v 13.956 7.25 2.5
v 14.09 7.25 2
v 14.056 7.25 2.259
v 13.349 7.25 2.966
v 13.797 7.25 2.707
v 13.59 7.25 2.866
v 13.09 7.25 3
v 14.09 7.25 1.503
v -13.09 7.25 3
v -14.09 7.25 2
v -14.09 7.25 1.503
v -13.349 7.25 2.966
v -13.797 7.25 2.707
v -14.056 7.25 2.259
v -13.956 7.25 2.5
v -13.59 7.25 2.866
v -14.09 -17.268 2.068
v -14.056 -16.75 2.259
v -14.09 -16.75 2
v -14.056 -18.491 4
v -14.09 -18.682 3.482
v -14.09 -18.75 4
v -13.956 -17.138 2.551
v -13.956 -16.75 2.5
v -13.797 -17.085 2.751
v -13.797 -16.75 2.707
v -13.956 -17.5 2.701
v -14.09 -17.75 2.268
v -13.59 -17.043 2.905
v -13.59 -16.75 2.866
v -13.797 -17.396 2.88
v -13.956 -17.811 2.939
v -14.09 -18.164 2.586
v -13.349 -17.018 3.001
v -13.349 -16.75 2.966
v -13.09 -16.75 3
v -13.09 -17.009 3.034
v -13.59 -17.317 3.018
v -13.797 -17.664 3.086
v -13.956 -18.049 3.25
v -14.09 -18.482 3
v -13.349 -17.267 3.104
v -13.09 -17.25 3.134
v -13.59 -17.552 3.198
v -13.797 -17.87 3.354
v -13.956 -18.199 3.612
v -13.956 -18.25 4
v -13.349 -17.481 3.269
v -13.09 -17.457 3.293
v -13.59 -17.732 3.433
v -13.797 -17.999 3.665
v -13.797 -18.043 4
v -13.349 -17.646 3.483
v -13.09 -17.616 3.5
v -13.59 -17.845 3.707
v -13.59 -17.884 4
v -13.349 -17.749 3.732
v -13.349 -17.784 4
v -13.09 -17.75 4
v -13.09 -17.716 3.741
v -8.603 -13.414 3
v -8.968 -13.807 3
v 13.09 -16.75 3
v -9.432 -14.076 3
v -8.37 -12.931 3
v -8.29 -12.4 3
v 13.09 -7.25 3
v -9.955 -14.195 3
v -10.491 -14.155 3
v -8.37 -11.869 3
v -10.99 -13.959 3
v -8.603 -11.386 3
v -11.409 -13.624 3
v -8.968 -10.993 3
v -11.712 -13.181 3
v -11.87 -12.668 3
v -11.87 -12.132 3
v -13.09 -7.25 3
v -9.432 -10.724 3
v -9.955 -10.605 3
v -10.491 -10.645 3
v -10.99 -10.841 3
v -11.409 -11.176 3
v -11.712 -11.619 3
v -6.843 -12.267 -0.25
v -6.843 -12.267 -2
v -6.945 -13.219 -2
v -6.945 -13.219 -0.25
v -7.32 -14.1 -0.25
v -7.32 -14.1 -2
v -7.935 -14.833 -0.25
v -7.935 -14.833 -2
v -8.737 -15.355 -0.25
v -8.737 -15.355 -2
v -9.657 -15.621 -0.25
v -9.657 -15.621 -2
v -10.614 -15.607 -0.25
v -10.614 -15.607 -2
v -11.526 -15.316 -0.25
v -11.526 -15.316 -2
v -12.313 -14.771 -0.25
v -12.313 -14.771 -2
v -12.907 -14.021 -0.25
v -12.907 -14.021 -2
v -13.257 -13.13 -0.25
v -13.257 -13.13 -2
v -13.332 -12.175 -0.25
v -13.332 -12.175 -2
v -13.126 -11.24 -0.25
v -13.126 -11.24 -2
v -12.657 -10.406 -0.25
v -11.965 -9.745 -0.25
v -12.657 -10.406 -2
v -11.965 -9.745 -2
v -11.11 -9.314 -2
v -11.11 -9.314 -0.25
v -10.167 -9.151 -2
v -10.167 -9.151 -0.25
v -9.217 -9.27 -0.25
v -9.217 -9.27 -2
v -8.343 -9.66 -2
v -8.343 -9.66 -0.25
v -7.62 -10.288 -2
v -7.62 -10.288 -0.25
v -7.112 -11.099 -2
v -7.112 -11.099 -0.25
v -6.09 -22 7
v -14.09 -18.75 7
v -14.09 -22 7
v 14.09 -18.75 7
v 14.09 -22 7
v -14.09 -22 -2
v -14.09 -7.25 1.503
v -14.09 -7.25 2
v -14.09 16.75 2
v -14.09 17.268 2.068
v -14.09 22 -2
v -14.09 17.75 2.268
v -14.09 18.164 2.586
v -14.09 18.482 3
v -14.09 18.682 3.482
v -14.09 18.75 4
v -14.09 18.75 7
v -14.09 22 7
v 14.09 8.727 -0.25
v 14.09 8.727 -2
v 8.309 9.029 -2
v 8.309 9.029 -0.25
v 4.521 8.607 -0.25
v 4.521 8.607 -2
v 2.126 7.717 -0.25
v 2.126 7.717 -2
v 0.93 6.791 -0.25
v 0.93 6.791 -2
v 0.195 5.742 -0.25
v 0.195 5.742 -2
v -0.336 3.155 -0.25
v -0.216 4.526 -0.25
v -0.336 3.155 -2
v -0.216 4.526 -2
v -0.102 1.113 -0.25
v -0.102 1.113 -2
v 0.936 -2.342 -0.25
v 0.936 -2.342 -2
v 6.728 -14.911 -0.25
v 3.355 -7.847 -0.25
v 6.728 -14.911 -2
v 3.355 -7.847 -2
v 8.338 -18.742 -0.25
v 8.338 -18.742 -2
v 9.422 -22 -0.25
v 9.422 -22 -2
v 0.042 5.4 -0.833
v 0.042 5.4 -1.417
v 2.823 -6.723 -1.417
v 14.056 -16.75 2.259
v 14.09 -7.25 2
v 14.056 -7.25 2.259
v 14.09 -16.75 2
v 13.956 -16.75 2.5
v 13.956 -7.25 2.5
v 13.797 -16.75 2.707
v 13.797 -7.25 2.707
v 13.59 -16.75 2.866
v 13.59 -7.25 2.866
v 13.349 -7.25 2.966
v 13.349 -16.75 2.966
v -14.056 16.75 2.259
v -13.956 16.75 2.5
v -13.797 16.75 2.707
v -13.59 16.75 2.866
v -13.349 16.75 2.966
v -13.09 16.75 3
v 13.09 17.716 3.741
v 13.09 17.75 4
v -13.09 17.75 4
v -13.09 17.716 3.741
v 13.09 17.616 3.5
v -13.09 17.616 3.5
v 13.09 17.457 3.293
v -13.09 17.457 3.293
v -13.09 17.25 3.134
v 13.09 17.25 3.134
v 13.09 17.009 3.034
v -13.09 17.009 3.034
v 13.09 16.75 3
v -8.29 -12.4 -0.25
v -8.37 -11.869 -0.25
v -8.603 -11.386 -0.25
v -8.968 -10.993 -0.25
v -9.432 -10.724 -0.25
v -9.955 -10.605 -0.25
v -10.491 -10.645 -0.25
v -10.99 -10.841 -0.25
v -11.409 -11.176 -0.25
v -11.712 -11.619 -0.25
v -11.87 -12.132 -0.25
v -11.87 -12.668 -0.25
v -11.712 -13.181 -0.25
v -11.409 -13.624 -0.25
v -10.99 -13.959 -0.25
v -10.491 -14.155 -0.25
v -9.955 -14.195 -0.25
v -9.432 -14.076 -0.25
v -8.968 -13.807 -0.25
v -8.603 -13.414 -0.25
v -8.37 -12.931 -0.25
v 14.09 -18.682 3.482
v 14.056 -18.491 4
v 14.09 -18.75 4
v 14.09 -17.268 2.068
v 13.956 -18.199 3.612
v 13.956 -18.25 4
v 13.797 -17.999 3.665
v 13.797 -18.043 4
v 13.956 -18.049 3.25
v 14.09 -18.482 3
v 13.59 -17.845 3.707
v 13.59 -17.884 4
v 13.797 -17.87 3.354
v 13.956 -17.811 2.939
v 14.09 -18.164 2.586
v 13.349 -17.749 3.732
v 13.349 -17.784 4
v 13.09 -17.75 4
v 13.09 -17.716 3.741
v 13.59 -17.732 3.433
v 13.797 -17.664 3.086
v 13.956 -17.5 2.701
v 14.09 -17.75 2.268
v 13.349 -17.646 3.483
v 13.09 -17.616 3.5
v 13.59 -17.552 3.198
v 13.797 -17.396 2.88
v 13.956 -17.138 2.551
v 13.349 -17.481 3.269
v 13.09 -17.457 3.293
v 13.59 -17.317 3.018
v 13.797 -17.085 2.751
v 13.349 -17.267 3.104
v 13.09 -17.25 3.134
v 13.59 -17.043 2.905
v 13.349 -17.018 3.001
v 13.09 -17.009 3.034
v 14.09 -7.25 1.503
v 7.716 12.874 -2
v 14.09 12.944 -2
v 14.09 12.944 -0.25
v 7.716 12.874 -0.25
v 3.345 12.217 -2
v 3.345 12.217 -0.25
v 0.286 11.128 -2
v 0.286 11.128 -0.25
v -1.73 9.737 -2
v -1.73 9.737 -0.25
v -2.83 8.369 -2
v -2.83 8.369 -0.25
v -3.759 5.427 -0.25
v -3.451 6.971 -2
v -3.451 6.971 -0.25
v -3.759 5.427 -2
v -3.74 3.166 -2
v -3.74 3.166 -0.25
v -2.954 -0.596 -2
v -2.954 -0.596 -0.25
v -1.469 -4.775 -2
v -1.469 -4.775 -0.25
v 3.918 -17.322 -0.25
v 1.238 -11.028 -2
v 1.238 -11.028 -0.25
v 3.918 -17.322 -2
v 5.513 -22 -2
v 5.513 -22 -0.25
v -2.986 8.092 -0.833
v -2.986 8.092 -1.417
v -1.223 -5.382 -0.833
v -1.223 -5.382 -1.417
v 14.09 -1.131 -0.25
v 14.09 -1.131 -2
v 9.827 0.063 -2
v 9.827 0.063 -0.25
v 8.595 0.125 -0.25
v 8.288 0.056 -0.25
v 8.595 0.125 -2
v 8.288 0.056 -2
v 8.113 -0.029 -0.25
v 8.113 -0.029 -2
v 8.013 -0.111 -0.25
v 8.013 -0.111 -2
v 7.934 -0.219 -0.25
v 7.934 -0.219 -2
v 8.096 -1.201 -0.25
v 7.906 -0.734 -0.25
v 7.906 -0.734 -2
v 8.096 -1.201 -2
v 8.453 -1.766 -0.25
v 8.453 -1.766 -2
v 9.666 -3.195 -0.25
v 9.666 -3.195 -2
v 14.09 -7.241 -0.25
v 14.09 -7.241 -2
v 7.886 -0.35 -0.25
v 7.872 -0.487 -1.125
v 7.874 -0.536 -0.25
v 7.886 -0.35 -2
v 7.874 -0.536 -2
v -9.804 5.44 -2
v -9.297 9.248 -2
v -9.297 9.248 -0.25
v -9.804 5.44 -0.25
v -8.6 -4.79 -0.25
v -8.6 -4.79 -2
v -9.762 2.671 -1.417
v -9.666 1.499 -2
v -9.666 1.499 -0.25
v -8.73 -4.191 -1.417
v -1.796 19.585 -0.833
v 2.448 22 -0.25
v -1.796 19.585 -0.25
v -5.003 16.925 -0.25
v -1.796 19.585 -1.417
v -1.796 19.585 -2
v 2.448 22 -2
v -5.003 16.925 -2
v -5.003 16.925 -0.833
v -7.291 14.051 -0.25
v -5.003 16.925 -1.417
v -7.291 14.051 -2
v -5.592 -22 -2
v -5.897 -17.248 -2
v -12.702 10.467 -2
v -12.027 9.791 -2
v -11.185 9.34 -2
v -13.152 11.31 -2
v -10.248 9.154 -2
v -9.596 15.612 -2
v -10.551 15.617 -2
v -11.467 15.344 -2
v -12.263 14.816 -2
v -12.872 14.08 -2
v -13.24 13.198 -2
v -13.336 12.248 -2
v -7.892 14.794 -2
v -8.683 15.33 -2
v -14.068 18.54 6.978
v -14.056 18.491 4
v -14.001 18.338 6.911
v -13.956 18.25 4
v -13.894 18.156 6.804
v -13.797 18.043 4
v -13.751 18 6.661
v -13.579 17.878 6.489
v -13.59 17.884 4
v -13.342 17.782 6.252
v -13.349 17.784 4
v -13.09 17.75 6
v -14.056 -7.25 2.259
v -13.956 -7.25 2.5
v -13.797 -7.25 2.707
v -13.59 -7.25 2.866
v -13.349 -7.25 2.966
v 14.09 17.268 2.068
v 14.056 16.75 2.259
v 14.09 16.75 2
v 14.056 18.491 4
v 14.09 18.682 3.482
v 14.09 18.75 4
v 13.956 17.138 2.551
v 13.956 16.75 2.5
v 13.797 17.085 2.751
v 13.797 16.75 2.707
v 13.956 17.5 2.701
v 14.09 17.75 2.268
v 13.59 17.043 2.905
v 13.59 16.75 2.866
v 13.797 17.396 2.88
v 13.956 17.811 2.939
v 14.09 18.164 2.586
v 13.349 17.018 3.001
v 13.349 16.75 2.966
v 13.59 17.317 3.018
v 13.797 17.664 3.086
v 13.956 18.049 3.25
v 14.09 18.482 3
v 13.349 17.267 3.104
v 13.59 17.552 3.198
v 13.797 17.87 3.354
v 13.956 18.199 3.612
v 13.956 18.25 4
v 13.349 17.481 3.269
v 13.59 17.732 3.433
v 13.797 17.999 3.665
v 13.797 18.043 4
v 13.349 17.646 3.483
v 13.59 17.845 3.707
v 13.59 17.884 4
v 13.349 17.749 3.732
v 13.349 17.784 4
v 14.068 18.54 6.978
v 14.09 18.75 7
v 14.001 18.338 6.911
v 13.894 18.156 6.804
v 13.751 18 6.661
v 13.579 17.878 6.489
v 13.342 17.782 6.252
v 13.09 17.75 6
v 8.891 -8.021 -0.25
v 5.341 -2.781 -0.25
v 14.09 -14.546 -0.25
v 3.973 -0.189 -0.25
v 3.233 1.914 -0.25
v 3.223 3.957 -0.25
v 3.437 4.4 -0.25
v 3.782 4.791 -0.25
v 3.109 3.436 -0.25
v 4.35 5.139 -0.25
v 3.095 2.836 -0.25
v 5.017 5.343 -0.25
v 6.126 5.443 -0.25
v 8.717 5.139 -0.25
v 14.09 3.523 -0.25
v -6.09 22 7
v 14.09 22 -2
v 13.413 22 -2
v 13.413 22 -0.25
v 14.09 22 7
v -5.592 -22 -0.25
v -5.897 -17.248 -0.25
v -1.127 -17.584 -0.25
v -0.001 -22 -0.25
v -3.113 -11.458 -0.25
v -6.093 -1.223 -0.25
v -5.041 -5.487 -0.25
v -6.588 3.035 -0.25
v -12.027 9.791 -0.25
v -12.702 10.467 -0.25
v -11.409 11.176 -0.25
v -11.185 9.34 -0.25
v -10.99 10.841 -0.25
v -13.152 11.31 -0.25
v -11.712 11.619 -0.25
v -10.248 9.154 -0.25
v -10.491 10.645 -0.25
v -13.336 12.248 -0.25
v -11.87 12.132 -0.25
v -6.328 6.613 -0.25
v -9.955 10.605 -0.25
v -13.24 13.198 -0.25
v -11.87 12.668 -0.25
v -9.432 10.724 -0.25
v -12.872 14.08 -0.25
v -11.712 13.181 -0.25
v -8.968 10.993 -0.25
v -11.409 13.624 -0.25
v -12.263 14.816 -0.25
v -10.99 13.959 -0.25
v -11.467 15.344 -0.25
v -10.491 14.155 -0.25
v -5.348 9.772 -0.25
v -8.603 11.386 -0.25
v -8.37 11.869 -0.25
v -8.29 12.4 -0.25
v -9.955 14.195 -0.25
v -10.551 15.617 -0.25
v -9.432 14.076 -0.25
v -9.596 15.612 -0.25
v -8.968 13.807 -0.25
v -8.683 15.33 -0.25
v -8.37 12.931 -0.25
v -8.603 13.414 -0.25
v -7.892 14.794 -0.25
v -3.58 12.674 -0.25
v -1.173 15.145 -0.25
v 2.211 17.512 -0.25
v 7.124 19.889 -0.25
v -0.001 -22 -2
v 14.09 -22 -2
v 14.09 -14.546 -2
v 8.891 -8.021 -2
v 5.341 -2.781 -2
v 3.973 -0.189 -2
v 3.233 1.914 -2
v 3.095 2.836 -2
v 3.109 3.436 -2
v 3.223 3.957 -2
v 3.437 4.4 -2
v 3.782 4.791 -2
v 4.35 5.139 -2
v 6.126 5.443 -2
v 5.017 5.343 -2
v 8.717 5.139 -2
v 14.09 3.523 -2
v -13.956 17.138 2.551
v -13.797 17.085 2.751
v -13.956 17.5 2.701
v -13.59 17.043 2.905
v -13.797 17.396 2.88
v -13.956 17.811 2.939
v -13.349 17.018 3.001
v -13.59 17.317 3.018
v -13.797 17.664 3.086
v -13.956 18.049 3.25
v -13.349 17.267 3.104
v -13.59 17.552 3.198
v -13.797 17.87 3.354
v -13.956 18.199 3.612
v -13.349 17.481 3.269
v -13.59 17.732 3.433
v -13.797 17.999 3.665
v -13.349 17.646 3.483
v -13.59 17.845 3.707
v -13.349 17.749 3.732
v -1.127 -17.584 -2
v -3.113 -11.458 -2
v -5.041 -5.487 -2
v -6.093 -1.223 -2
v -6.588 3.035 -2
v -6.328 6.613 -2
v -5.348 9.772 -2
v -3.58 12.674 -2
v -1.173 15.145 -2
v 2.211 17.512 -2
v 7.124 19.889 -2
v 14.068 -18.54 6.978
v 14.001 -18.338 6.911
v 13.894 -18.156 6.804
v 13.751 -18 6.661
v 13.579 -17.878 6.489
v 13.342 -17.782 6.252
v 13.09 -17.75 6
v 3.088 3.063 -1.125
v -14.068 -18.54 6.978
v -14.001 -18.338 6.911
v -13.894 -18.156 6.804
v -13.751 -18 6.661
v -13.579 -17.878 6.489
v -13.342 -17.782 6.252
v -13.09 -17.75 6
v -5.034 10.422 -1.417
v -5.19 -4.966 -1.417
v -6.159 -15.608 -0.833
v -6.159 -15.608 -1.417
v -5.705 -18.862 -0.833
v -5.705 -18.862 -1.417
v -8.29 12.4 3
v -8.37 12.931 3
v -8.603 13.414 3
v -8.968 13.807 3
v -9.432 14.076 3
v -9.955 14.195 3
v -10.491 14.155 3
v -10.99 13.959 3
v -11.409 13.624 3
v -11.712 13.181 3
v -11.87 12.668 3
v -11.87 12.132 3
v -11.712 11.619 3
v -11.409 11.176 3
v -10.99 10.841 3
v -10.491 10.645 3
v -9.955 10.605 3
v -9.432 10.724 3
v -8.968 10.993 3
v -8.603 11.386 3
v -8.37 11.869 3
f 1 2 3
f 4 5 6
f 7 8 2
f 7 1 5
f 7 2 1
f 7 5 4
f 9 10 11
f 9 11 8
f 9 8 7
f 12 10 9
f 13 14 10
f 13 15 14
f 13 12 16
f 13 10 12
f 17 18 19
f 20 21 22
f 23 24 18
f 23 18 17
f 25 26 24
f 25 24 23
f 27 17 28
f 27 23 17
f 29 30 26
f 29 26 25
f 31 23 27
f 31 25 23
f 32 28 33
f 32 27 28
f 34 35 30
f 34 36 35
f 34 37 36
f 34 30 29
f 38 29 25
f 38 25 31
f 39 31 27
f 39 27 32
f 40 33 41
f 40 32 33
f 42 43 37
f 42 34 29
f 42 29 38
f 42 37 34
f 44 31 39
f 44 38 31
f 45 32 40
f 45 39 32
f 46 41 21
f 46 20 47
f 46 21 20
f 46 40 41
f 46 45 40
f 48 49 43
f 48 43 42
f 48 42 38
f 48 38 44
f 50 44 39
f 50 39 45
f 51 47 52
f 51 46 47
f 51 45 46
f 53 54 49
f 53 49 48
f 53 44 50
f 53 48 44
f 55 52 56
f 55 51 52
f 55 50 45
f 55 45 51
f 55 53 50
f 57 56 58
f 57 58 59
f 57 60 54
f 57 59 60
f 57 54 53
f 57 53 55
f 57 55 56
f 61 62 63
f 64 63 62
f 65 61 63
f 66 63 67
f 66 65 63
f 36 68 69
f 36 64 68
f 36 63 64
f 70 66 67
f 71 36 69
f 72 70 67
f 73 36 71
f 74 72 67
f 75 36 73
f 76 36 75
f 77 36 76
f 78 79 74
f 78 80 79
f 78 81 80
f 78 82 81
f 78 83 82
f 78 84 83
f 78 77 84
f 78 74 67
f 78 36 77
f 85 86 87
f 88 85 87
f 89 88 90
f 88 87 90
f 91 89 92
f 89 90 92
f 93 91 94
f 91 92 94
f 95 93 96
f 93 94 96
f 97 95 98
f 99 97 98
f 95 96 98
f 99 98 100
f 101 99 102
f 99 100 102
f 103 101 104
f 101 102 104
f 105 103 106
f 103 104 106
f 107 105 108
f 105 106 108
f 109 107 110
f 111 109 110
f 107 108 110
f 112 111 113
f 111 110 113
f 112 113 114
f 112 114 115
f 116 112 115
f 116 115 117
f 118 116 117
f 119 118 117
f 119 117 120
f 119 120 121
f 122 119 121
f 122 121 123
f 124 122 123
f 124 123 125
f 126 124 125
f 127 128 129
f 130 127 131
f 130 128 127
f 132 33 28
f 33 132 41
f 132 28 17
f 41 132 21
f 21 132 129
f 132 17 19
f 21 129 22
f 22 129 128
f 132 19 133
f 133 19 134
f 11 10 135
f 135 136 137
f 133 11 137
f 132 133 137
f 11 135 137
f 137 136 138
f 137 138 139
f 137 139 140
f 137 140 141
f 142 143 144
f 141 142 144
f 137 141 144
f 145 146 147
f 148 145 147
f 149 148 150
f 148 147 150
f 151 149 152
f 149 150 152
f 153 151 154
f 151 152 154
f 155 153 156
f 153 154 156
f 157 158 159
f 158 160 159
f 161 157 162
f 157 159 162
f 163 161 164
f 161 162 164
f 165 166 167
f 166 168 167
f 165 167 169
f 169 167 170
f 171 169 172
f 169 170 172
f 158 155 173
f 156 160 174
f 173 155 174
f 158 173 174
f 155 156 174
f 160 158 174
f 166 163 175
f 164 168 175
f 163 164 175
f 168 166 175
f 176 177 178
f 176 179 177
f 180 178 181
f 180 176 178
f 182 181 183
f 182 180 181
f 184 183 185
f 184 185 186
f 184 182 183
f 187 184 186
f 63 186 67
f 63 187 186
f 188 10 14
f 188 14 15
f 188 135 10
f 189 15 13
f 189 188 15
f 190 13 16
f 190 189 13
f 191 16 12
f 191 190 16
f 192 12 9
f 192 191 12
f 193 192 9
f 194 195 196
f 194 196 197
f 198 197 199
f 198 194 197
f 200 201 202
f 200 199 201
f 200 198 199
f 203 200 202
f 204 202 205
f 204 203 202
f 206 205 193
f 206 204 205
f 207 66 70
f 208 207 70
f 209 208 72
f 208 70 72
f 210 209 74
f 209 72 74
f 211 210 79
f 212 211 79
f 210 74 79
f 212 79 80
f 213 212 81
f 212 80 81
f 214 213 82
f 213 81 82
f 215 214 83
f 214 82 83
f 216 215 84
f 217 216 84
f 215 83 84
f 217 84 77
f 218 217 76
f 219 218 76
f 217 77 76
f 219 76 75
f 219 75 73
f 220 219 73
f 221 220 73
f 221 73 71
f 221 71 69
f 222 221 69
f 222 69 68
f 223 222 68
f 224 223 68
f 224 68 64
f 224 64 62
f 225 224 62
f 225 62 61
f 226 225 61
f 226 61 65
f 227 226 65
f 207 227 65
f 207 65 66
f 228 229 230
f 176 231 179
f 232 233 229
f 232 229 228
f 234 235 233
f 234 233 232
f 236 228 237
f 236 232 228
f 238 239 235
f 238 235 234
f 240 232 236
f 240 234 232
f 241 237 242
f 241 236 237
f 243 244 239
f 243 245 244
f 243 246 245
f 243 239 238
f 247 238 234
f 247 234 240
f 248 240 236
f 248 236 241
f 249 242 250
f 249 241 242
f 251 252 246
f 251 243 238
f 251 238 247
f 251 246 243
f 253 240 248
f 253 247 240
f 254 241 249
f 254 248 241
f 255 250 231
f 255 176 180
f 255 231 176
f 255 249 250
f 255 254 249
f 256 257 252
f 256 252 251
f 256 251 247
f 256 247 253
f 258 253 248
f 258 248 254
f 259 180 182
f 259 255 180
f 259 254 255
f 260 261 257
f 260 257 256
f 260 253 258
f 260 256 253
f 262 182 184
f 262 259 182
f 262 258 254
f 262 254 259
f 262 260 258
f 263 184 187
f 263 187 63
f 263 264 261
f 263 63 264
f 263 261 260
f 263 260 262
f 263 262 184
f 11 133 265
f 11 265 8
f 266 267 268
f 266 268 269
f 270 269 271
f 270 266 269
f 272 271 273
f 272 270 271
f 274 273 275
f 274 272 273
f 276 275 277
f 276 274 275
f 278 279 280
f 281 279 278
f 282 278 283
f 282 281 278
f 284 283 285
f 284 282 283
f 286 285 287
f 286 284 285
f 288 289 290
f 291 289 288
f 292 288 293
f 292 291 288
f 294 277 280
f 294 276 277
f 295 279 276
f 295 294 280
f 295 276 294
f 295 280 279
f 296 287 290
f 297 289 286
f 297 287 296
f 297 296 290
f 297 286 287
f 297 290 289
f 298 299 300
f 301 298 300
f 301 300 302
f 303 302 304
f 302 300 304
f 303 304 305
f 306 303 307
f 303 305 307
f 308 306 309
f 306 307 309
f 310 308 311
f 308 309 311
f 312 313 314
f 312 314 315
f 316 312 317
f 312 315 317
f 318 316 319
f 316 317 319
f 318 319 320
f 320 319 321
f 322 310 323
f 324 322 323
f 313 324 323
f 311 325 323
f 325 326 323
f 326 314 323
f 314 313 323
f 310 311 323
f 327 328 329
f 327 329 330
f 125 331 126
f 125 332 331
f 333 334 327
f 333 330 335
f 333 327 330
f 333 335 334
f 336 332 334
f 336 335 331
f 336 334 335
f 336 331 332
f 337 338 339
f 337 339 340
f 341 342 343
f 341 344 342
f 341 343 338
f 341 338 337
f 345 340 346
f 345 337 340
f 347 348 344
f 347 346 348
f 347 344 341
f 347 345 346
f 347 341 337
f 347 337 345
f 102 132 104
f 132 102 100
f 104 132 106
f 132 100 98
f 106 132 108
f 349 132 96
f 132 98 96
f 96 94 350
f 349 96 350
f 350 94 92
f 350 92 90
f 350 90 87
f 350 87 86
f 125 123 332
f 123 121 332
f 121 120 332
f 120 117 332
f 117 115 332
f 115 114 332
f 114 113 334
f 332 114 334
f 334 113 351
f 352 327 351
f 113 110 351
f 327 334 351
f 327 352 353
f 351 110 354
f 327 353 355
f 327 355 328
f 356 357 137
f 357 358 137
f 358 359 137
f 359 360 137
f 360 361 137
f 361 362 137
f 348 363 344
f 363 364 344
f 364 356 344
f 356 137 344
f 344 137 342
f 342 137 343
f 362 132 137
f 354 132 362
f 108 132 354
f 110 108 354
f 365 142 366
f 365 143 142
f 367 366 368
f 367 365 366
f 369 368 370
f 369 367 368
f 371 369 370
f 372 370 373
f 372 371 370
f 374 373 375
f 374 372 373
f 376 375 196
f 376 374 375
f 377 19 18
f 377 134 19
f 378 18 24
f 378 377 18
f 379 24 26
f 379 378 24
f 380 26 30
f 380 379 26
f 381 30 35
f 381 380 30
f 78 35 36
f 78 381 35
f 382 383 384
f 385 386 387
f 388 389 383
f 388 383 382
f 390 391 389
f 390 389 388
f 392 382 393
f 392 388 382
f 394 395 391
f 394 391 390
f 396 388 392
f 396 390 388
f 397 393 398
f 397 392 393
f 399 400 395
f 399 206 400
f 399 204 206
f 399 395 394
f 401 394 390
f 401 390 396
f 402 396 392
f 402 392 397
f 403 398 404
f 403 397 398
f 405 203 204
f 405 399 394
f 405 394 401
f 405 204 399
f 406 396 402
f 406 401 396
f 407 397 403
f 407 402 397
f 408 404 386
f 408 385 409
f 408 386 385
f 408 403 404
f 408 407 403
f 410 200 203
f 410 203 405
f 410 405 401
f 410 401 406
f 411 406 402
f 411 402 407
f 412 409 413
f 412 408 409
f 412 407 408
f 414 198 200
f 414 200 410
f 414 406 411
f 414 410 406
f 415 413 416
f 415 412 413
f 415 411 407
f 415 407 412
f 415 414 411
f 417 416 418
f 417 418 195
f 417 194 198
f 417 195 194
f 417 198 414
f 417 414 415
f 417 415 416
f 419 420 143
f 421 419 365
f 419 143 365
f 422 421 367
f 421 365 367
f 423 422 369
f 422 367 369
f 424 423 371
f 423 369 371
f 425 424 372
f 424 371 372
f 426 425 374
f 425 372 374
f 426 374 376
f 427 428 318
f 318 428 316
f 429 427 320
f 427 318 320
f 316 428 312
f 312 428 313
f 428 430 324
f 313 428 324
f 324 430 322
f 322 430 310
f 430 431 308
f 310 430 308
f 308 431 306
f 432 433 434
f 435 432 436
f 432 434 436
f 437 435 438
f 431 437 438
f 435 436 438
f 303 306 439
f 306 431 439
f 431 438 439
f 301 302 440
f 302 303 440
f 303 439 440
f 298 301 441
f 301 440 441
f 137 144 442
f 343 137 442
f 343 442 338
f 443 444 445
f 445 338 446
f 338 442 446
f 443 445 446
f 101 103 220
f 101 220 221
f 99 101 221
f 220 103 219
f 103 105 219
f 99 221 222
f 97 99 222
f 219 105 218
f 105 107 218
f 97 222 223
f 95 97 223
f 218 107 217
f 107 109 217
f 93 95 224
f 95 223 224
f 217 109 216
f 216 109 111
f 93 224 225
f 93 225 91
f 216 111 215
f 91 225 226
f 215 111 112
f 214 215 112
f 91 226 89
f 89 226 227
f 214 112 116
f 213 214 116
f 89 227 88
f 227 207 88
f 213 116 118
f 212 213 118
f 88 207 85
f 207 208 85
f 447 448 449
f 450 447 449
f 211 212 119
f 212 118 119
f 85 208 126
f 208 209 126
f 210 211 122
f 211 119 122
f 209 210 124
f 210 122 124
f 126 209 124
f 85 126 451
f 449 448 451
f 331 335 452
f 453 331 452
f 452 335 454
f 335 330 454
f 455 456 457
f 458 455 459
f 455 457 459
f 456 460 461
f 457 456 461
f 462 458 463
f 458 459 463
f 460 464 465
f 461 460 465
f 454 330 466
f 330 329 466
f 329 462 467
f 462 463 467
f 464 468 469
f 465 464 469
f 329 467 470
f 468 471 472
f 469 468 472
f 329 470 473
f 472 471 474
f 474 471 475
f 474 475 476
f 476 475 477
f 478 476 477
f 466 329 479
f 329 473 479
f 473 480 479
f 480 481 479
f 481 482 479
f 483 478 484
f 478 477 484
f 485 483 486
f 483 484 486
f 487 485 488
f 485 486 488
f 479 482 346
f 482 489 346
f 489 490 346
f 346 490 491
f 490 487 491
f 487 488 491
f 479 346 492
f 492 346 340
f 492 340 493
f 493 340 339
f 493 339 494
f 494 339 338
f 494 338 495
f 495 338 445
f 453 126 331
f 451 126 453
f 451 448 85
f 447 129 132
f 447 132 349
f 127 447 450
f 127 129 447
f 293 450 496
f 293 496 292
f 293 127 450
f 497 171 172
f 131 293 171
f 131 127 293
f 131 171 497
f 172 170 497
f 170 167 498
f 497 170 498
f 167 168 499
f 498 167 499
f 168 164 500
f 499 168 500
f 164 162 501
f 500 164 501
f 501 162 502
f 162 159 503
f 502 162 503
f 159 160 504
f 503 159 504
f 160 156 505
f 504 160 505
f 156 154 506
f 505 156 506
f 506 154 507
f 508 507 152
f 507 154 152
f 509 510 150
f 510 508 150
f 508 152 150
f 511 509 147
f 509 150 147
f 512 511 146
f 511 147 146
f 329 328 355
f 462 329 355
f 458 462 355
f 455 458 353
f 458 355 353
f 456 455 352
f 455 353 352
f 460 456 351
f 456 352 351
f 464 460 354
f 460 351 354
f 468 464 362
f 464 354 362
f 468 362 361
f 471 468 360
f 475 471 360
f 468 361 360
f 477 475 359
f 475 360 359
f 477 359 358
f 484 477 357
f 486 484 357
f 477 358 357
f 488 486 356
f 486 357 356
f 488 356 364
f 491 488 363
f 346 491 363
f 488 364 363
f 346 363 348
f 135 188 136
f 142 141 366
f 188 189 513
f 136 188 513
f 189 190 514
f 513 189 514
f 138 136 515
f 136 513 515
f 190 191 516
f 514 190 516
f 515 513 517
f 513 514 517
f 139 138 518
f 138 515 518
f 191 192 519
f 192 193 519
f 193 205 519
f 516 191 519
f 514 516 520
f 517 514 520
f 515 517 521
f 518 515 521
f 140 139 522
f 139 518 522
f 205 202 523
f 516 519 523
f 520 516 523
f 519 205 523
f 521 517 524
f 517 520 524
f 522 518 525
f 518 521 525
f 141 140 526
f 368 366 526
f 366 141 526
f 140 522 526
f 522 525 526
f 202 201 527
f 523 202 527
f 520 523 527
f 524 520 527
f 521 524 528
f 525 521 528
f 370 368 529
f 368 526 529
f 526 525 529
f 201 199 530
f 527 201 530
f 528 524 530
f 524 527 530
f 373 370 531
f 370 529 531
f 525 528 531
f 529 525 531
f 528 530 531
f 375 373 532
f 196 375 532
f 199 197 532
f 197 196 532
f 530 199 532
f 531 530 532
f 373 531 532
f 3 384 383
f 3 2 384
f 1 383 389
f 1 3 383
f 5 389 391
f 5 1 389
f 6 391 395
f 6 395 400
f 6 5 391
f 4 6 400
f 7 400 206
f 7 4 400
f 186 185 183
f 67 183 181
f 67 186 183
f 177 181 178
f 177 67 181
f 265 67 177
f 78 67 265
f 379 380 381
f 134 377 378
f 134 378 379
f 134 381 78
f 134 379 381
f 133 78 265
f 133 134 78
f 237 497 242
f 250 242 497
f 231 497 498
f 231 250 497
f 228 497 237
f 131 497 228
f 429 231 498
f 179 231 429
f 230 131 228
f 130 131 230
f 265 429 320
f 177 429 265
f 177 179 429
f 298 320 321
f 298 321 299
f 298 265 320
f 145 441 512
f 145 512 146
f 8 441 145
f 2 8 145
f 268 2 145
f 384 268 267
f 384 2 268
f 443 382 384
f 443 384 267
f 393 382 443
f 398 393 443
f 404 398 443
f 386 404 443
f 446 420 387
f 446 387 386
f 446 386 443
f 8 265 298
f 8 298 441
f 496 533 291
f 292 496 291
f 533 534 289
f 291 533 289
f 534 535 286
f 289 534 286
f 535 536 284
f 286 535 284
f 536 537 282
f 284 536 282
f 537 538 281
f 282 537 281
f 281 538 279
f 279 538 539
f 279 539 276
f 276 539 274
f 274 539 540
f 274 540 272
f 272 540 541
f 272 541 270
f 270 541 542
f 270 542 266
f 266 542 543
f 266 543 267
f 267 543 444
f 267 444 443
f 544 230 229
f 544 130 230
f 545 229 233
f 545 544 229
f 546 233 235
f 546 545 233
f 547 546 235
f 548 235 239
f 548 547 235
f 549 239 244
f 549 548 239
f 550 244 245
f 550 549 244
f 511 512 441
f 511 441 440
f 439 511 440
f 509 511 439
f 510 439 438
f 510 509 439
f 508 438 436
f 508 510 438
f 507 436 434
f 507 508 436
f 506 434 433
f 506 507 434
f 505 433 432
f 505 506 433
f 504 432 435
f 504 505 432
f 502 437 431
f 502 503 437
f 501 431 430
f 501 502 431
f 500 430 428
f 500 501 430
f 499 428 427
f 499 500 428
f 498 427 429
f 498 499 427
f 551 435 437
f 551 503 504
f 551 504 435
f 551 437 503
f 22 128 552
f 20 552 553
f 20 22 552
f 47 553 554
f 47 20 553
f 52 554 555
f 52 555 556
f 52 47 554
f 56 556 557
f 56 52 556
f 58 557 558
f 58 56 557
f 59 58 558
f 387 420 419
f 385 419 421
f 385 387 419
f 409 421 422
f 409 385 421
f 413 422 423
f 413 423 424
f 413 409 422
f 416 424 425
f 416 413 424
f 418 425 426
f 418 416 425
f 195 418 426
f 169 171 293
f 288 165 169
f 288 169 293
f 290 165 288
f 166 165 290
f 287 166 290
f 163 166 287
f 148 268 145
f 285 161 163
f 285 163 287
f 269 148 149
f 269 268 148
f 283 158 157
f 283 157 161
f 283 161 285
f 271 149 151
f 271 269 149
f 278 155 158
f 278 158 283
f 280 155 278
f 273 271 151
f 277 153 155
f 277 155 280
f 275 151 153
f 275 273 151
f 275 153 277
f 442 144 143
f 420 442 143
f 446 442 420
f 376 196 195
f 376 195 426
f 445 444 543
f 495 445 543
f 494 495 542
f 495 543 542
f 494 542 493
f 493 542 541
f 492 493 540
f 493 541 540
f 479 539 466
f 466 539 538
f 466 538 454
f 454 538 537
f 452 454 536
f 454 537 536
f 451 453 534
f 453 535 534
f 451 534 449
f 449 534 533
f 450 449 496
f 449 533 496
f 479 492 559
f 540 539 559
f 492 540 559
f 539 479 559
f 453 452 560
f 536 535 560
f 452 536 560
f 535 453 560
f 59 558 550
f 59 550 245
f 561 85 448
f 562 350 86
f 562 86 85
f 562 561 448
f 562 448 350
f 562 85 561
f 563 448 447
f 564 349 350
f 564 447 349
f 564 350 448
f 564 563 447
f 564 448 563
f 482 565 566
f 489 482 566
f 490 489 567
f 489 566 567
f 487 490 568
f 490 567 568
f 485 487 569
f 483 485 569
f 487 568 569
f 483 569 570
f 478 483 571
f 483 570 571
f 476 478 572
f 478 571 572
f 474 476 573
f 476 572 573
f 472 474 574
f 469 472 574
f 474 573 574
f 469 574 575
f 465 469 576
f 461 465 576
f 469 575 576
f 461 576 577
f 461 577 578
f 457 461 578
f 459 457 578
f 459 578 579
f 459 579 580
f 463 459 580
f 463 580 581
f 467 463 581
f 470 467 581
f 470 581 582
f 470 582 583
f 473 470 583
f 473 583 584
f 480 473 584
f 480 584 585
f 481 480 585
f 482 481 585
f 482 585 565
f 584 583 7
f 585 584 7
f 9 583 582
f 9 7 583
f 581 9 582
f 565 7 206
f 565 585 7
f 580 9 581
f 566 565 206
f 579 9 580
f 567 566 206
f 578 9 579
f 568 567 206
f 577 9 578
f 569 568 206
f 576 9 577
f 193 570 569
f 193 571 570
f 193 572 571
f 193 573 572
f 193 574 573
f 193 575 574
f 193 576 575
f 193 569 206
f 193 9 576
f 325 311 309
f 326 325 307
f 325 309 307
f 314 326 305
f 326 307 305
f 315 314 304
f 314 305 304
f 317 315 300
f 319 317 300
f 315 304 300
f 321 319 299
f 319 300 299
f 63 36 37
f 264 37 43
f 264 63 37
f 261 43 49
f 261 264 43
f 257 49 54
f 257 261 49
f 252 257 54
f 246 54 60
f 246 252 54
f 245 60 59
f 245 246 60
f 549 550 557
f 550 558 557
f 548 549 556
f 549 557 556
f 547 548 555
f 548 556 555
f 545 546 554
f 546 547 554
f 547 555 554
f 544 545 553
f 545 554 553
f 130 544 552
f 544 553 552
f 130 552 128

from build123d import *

# Parameters (mm, degrees)
SKETCH1_W                = 28.18
SKETCH1_H                = 44
BOSS_EXTRUDE1_DEPTH      = 11
BOSS_EXTRUDE1_DEPTH_BACK = 2
CUT_EXTRUDE1_DEPTH       = 37
SKETCH4_W                = 20.18
SKETCH4_H                = 4
CUT_EXTRUDE2_DEPTH       = 48
CUT_EXTRUDE3_DEPTH       = 1.75
SKETCH7_R                = 1.8
CUT_EXTRUDE4_DEPTH       = 23
SKETCH10_W               = 11.795844225
SKETCH10_H               = 4.586005201
CUT_EXTRUDE7_DEPTH       = 53
FILLET1_R                = 1
SKETCH8_R                = 3.25
CUT_EXTRUDE5_DEPTH       = 1.75


with BuildPart() as part:
    # Sketch1 → Boss-Extrude1 (new body, two sides)
    with BuildSketch(Plane.XY) as boss_extrude1_sk:
        Rectangle(SKETCH1_W, SKETCH1_H)
    extrude(amount=BOSS_EXTRUDE1_DEPTH)
    extrude(boss_extrude1_sk.sketch, amount=-BOSS_EXTRUDE1_DEPTH_BACK)

    # Sketch3 → Cut-Extrude1 (cut)
    with BuildSketch(Plane.ZY.offset(14.09)):
        Polygon((8, 7.25), (11, 7.25), (11, -7.25), (8, -7.25), (8, -17.75), (3, -17.75), (3, -7.25), (1.5033938, -7.25), (1.5033938, 7.25), (3, 7.25), (3, 17.75), (8, 17.75), align=None)
    extrude(amount=-CUT_EXTRUDE1_DEPTH, mode=Mode.SUBTRACT)

    # Sketch4 → Cut-Extrude2 (cut)
    with BuildSketch(Plane.XZ.offset(22)):
        with Locations((4, 9)):
            Rectangle(SKETCH4_W, SKETCH4_H)
    extrude(amount=-CUT_EXTRUDE2_DEPTH, mode=Mode.SUBTRACT)

    # Sketch5 → Cut-Extrude3 (cut)
    with BuildSketch(Plane(origin=(0, 0, -2), x_dir=(-1, 0, 0), z_dir=(0, 0, -1))):
        with BuildLine():
            Line((-9.422350513, -22), (-5.513274624, -22))
            add(Edge.make_bspline(
                [(-14.09, 12.943541527), (17.027152303, 14.230895657), (-0.913223026, -5.637747584), (-5.513274624, -22)],
                knots=[0, 0, 0, 0, 0.88215351, 0.88215351, 0.88215351, 0.88215351], degree=3))
            Line((-14.09, 12.943541527), (-14.09, 8.727219843))
            add(Edge.make_bspline(
                [(-14.09, 8.727219843), (12.710361443, 11.678555955), (-5.250487577, -7.026945605), (-9.422350513, -22)],
                knots=[0, 0, 0, 0, 0.871233208, 0.871233208, 0.871233208, 0.871233208], degree=3))
        make_face()
        with BuildLine():
            add(Edge.make_bspline(
                [(-14.09, 3.523280295), (7.913446573, 11.6376574), (-14.09, -14.545652593)],
                knots=[0, 0, 0, 1, 1, 1], degree=2))
            Line((-14.09, 3.523280295), (-14.09, -1.131328535))
            add(Edge.make_bspline(
                [(-14.09, -1.131328535), (-1.654052468, 3.211926994), (-14.09, -7.240502624)],
                knots=[0, 0, 0, 1, 1, 1], degree=2))
            Line((-14.09, -7.240502624), (-14.09, -14.545652593))
        make_face()
        with BuildLine():
            add(Edge.make_bspline(
                [(-2.448223174, 22), (19.56705897, 11.536361781), (5.151599528, -7.62224079), (5.592236917, -22)],
                knots=[0, 0, 0, 0, 0.832841206, 0.832841206, 0.832841206, 0.832841206], degree=3))
            Line((-2.448223174, 22), (-13.413117725, 22))
            add(Edge.make_bspline(
                [(-13.413117725, 22), (18.496116363, 13.047461166), (3.546154763, -4.863207343), (0.001206333, -22)],
                knots=[0, 0, 0, 0, 0.886771983, 0.886771983, 0.886771983, 0.886771983], degree=3))
            Line((0.001206333, -22), (5.592236917, -22))
        make_face()
    extrude(amount=-CUT_EXTRUDE3_DEPTH, mode=Mode.SUBTRACT)

    # Sketch7 → Cut-Extrude4 (cut)
    with BuildSketch(Plane.XY.offset(11)):
        with Locations((-10.09, 12.4)):
            Circle(SKETCH7_R)
        with Locations((-10.09, -12.4)):
            Circle(SKETCH7_R)
    extrude(amount=-CUT_EXTRUDE4_DEPTH, mode=Mode.SUBTRACT)

    # Sketch10 → Cut-Extrude7 (cut)
    with BuildSketch(Plane(origin=(0, 22, 0), x_dir=(1, 0, 0), z_dir=(0, 1, 0))):
        with Locations((-10.712086776, -9.2930026)):
            Rectangle(SKETCH10_W, SKETCH10_H)
    extrude(amount=-CUT_EXTRUDE7_DEPTH, mode=Mode.SUBTRACT)

    # Fillet1
    fillet1_edges = [part.edges().sort_by_distance(p)[0] for p in [
        (-14.09, 17.75, 5),
        (14.09, -12.5, 3),
        (14.09, 12.5, 3),
        (14.09, 17.75, 5),
        (0, -17.75, 3),
        (0, 17.75, 3),
        (-14.09, -12.5, 3),
        (-14.09, -17.75, 5),
        (-14.09, 12.5, 3),
        (14.09, -17.75, 5),
        (0, -17.75, 7),
        (0, 17.75, 7),
    ]]
    fillet(fillet1_edges, radius=FILLET1_R)

    # Sketch8 → Cut-Extrude5 (cut)
    with BuildSketch(Plane(origin=(0, 0, -2), x_dir=(-1, 0, 0), z_dir=(0, 0, -1))):
        with Locations((10.09, -12.4)):
            Circle(SKETCH8_R)
        with Locations((10.09, 12.4)):
            Circle(SKETCH8_R)
    extrude(amount=-CUT_EXTRUDE5_DEPTH, mode=Mode.SUBTRACT)


solid = part.part
